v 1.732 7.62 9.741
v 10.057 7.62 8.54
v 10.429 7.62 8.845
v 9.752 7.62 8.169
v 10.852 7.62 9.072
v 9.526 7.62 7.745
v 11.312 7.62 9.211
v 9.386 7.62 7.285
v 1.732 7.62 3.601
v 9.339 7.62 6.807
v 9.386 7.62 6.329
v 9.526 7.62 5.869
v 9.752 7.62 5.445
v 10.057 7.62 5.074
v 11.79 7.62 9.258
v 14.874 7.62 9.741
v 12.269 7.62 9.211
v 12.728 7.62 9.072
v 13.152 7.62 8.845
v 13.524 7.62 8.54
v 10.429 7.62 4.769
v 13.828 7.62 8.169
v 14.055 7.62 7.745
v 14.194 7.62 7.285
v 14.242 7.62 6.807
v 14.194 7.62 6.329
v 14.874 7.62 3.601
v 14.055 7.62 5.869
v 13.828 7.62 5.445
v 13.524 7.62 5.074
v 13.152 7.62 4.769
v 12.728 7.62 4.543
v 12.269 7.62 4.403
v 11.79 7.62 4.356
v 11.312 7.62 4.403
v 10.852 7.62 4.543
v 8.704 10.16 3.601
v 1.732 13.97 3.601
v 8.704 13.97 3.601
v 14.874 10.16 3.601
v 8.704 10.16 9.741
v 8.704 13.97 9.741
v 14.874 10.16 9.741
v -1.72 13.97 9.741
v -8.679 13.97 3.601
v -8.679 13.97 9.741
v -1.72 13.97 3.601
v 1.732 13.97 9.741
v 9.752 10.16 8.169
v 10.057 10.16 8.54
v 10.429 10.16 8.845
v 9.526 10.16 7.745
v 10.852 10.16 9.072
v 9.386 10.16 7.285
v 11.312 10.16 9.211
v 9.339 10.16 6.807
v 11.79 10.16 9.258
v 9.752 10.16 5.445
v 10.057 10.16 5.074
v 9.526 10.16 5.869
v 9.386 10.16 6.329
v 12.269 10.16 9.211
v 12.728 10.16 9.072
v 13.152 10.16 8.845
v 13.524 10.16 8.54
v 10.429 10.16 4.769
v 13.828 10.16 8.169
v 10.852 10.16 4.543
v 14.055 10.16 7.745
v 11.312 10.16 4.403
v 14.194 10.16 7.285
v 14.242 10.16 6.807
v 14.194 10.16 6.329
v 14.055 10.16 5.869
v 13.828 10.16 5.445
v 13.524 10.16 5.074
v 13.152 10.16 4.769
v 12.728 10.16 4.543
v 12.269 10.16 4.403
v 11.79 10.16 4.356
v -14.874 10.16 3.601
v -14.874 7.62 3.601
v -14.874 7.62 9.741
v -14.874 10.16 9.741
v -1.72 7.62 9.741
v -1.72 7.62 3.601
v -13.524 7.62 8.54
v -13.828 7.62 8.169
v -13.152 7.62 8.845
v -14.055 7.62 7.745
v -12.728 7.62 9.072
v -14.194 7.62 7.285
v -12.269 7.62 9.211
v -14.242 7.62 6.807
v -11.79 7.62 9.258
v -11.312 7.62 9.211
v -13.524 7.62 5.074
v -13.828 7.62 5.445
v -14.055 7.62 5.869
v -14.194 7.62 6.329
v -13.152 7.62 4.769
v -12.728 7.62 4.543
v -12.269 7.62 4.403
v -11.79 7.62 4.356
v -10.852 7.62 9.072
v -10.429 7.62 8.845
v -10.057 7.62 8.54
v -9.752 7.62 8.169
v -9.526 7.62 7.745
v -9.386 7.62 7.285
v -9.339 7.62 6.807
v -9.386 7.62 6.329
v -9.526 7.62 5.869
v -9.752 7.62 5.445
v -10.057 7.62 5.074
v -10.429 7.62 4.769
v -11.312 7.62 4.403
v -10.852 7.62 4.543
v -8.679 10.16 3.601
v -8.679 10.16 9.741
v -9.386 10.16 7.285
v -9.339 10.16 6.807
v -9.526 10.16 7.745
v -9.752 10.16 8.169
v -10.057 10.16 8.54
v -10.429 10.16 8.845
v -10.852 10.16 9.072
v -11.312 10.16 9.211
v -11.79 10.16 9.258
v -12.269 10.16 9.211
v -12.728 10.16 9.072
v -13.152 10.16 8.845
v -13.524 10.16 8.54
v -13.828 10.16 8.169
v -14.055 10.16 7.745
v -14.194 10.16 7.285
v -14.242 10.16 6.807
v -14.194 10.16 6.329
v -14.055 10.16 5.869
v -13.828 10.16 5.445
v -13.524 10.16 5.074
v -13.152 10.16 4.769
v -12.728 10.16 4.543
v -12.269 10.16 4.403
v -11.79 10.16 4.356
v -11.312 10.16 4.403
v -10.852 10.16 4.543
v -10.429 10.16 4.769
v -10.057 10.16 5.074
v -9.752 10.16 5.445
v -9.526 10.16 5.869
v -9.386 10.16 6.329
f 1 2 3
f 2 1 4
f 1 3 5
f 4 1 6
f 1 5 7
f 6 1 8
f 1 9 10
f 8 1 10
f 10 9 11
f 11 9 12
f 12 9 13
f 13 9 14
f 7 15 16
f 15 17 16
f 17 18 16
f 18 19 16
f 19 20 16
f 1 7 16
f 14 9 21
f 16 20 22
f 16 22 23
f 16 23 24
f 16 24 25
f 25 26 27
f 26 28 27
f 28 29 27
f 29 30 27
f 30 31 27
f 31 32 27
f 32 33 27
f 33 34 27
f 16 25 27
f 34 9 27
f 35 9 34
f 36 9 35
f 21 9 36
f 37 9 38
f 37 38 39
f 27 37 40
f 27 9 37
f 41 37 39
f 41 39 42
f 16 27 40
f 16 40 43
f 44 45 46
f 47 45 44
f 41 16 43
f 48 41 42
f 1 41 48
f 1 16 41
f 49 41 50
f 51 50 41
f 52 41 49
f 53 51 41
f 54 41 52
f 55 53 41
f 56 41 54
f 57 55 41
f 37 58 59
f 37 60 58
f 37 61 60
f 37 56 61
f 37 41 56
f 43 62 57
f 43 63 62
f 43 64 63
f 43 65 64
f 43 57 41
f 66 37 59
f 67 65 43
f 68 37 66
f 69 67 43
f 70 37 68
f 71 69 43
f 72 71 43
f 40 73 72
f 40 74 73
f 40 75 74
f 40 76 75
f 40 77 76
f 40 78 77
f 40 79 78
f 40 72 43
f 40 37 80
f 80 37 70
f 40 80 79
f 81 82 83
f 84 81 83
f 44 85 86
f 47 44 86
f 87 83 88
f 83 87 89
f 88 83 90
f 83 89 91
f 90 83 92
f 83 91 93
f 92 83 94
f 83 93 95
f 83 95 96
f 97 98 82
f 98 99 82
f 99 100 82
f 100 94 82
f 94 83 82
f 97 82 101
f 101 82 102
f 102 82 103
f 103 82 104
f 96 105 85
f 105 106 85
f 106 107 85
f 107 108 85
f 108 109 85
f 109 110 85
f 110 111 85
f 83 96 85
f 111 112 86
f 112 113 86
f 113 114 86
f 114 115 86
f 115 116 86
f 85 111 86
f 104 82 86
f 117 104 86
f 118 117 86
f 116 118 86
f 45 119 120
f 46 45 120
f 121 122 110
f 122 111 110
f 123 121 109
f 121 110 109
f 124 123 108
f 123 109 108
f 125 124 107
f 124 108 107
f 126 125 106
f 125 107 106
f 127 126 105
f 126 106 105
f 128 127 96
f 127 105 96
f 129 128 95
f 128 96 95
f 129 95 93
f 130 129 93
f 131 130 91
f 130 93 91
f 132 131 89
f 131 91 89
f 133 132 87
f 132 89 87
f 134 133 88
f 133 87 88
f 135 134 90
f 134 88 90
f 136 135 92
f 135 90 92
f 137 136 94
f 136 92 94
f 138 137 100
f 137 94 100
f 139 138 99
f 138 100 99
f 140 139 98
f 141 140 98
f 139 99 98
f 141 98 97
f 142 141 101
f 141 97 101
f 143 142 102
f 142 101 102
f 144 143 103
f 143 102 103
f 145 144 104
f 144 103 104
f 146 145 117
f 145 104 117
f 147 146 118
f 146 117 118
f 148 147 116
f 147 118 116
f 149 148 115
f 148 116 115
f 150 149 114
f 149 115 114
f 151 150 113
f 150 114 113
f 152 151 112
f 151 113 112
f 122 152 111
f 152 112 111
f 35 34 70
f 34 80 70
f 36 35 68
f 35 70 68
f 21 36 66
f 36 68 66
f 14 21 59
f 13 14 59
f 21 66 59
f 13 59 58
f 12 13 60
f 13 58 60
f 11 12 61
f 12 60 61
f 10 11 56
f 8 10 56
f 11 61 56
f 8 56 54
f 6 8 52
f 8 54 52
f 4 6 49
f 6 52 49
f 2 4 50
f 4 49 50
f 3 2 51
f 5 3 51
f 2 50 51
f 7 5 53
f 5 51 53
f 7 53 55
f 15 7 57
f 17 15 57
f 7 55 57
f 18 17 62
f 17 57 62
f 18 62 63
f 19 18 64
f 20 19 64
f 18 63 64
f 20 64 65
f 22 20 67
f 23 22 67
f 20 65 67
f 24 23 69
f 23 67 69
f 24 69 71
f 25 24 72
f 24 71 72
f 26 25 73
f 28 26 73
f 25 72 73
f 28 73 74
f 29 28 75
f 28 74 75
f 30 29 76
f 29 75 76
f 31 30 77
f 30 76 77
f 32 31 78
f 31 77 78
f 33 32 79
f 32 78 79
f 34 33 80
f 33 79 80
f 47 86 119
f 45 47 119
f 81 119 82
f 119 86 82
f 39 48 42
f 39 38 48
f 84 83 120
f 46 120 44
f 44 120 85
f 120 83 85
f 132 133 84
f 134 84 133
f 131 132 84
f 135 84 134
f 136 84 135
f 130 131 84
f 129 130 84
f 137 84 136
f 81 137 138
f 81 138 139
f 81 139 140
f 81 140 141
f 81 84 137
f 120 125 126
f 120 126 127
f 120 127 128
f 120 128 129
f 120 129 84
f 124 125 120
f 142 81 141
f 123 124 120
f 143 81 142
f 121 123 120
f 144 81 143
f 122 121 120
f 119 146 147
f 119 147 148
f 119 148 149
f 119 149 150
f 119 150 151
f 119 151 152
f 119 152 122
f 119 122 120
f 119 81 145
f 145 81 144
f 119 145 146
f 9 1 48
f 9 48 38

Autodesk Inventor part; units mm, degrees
ref_plane "YZ Plane" through (0, 0, 0) normal (1, 0, 0) x (0, 1, 0)
ref_plane "XZ Plane" through (0, 0, 0) normal (0, 1, 0) x (-1, 0, 0)
ref_plane "XY Plane" through (0, 0, 0) normal (0, 0, 1) x (1, 0, 0)
ref_plane "Work Plane1" through (0, 0, 0) normal (0, -1, 0) x (1, 0, 0)
sketch "Sketch14" plane through (0, 0, 0) normal (0, -1, 0) x (1, 0, 0)
  circle A0 centre (11.7904, 6.8072) radius 2.4511 projected
  circle A1 centre (0, -13.6144) radius 2.4511 projected
  circle A2 centre (-11.7904, 6.8072) radius 2.4511 projected
  point P0 (0, 0)
ref_plane "Work Plane3" through (0, 0, 0) normal (0, -1, 0) x (1, 0, 0)
sketch "Sketch18" plane through (0, 0, 0) normal (0, -1, 0) x (1, 0, 0)
  circle A0 centre (-11.7904, 6.8072) radius 2.4511 projected
  circle A1 centre (-11.7904, 6.8072) radius 4.1697
  circle A2 centre (0, 0) radius 3.7517
  line L0 (-7.6207, 6.8072) -> (-7.6207, -16.064)
  circle A3 centre (0, 0) radius 17.78 projected
  line L1 (-7.6207, 6.8072) -> (-7.6207, 16.064)
  line L2 (-3.7517, 0) -> (-3.7517, -17.4687)
  line L3 (-3.7517, -17.4687) -> (-3.7517, 17.2429)
  circle A4 centre (11.7904, 6.8072) radius 2.4511 projected
  circle A5 centre (11.7904, 6.8072) radius 4.1697
  line L4 (7.6207, 6.8072) -> (7.6207, -16.064)
  line L5 (7.6207, 16.064) -> (7.6207, 6.8072)
  line L6 (-7.6207, 10.9769) -> (-3.7517, 10.9769)
  line L7 (-6.9141, -9.9949) -> (-3.7517, -9.9949)
  line L8 (-7.6207, -9.9949) -> (-6.5754, -9.9949)
  line L9 (3.7517, 10.9769) -> (7.6207, 10.9769)
  line L10 (3.7517, -9.9949) -> (7.6207, -9.9949)
  line L11 (0, 0) -> (3.7517, 0)
  line L12 (3.7517, 0) -> (3.7517, 10.8227)
  line L13 (3.7517, 10.8227) -> (3.7517, -9.9949)
  line L14 (3.7517, 10.8227) -> (3.7517, 10.9769)
  line L15 (7.6207, 10.9769) -> (3.7517, 10.9769)
  point P0 (3.7517, 0)
ref_plane "Work Plane4" through (0, 7.62, 0) normal (0, 1, 0) x (1, 0, 0)
sketch "Sketch19" plane through (0, 7.62, 0) normal (0, 1, 0) x (1, 0, 0)
  circle A0 centre (0, 0) radius 17.78 projected
  line L0 (1.7319, -3.6013) -> (14.874, -3.6013)
  line L1 (14.874, -3.6013) -> (14.874, -9.7412)
  line L2 (14.874, -9.7412) -> (1.7319, -9.7412)
  line L3 (1.7319, -9.7412) -> (1.7319, -3.6013)
extrude "Extrusion7" add sketch "Sketch19" along normal blind 2.54 contours L2 L3 L0 L1
ref_plane "Work Plane5" through (0, 10.16, 0) normal (0, 1, 0) x (1, 0, 0)
sketch "Sketch20" plane through (0, 10.16, 0) normal (0, 1, 0) x (1, 0, 0)
  circle A0 centre (11.7904, -6.8072) radius 2.4511 projected
  circle A1 centre (11.7904, -6.8072) radius 2.4511
  line L0 (7.6207, -3.6013) -> (14.874, -3.6013) projected
  line L1 (8.7038, -3.6013) -> (8.7038, -9.7412)
  line L2 (3.7517, -9.7412) -> (1.7319, -9.7412) projected
  line L3 (8.7038, -9.7412) -> (1.7319, -9.7412)
  line L4 (1.7319, -9.7412) -> (1.7319, -3.6013) projected
  line L5 (1.7319, -9.7412) -> (1.7319, -3.6013)
  line L6 (1.7319, -3.6013) -> (8.7038, -3.6013)
  point P0 (0, 0)
extrude "Extrusion8" add sketch "Sketch20" along normal blind 3.81 contours L0 L1 L3 L2 L4 L6
hole "Hole5" at (11.7904, 0, 6.8072) direction (0, 1, 0) diameter 4.9022 end through all
ref_plane "Work Plane2" through (0, 7.62, 0) normal (0, 1, 0) x (1, 0, 0)
sketch "Sketch21" plane through (0, 7.62, 0) normal (0, 1, 0) x (1, 0, 0)
  circle A0 centre (-11.7904, -6.8072) radius 2.4511 projected
  line L0 (-14.239, -6.6967) -> (-14.874, -6.6967)
  line L1 (1.7319, -9.7412) -> (1.7319, -3.6013) projected
  line L2 (1.7319, -3.6013) -> (-14.874, -3.6013)
  line L3 (-14.874, -3.6013) -> (-14.874, -6.6967)
  line L4 (1.7319, -9.7412) -> (-14.874, -9.7412)
  circle A1 centre (0, 0) radius 17.78 projected
  line L5 (-14.874, -6.6967) -> (-14.874, -9.7412)
  line L6 (-3.7517, 9.9949) -> (-3.7517, -10.9769) projected
  line L7 (-3.7517, -3.6013) -> (-1.7197, -3.6013)
  line L8 (-1.7197, -3.6013) -> (-1.7197, -9.7412)
  line L9 (-14.874, -9.7412) -> (-14.874, -3.6013)
  dimension "d67" = 0.635
  dimension "d68" = 2.032
extrude "Extrusion9" add sketch "Sketch21" along normal blind 2.54 contours L4 L6 L2 L8 | L4 L5 L3 L2 L6
sketch "Sketch22" plane through (0, 10.16, 0) normal (0, 1, 0) x (1, 0, 0)
  point P0 (0, 0)
sketch "Sketch23" plane through (0, 10.16, 0) normal (0, 1, 0) x (1, 0, 0)
  line L0 (8.7038, -3.6013) -> (1.7319, -3.6013) projected
  line L1 (-1.7197, -9.7412) -> (-1.7197, -3.6013) projected
  line L2 (-1.7197, -3.6013) -> (-8.6793, -3.6013)
  line L3 (-1.7197, -3.6013) -> (-14.874, -3.6013) projected
  line L4 (-8.6793, -3.6013) -> (-8.6793, -9.7412)
  line L5 (-14.874, -9.7412) -> (-1.7197, -9.7412) projected
  line L6 (-8.6793, -9.7412) -> (-1.7197, -9.7412)
  line L7 (-1.7197, -9.7412) -> (-1.7197, -3.6013)
  point P0 (0, 0)
  dimension "d71" = 6.9596
extrude "Extrusion10" add sketch "Sketch23" along normal blind 3.81
properties part number "cover"
